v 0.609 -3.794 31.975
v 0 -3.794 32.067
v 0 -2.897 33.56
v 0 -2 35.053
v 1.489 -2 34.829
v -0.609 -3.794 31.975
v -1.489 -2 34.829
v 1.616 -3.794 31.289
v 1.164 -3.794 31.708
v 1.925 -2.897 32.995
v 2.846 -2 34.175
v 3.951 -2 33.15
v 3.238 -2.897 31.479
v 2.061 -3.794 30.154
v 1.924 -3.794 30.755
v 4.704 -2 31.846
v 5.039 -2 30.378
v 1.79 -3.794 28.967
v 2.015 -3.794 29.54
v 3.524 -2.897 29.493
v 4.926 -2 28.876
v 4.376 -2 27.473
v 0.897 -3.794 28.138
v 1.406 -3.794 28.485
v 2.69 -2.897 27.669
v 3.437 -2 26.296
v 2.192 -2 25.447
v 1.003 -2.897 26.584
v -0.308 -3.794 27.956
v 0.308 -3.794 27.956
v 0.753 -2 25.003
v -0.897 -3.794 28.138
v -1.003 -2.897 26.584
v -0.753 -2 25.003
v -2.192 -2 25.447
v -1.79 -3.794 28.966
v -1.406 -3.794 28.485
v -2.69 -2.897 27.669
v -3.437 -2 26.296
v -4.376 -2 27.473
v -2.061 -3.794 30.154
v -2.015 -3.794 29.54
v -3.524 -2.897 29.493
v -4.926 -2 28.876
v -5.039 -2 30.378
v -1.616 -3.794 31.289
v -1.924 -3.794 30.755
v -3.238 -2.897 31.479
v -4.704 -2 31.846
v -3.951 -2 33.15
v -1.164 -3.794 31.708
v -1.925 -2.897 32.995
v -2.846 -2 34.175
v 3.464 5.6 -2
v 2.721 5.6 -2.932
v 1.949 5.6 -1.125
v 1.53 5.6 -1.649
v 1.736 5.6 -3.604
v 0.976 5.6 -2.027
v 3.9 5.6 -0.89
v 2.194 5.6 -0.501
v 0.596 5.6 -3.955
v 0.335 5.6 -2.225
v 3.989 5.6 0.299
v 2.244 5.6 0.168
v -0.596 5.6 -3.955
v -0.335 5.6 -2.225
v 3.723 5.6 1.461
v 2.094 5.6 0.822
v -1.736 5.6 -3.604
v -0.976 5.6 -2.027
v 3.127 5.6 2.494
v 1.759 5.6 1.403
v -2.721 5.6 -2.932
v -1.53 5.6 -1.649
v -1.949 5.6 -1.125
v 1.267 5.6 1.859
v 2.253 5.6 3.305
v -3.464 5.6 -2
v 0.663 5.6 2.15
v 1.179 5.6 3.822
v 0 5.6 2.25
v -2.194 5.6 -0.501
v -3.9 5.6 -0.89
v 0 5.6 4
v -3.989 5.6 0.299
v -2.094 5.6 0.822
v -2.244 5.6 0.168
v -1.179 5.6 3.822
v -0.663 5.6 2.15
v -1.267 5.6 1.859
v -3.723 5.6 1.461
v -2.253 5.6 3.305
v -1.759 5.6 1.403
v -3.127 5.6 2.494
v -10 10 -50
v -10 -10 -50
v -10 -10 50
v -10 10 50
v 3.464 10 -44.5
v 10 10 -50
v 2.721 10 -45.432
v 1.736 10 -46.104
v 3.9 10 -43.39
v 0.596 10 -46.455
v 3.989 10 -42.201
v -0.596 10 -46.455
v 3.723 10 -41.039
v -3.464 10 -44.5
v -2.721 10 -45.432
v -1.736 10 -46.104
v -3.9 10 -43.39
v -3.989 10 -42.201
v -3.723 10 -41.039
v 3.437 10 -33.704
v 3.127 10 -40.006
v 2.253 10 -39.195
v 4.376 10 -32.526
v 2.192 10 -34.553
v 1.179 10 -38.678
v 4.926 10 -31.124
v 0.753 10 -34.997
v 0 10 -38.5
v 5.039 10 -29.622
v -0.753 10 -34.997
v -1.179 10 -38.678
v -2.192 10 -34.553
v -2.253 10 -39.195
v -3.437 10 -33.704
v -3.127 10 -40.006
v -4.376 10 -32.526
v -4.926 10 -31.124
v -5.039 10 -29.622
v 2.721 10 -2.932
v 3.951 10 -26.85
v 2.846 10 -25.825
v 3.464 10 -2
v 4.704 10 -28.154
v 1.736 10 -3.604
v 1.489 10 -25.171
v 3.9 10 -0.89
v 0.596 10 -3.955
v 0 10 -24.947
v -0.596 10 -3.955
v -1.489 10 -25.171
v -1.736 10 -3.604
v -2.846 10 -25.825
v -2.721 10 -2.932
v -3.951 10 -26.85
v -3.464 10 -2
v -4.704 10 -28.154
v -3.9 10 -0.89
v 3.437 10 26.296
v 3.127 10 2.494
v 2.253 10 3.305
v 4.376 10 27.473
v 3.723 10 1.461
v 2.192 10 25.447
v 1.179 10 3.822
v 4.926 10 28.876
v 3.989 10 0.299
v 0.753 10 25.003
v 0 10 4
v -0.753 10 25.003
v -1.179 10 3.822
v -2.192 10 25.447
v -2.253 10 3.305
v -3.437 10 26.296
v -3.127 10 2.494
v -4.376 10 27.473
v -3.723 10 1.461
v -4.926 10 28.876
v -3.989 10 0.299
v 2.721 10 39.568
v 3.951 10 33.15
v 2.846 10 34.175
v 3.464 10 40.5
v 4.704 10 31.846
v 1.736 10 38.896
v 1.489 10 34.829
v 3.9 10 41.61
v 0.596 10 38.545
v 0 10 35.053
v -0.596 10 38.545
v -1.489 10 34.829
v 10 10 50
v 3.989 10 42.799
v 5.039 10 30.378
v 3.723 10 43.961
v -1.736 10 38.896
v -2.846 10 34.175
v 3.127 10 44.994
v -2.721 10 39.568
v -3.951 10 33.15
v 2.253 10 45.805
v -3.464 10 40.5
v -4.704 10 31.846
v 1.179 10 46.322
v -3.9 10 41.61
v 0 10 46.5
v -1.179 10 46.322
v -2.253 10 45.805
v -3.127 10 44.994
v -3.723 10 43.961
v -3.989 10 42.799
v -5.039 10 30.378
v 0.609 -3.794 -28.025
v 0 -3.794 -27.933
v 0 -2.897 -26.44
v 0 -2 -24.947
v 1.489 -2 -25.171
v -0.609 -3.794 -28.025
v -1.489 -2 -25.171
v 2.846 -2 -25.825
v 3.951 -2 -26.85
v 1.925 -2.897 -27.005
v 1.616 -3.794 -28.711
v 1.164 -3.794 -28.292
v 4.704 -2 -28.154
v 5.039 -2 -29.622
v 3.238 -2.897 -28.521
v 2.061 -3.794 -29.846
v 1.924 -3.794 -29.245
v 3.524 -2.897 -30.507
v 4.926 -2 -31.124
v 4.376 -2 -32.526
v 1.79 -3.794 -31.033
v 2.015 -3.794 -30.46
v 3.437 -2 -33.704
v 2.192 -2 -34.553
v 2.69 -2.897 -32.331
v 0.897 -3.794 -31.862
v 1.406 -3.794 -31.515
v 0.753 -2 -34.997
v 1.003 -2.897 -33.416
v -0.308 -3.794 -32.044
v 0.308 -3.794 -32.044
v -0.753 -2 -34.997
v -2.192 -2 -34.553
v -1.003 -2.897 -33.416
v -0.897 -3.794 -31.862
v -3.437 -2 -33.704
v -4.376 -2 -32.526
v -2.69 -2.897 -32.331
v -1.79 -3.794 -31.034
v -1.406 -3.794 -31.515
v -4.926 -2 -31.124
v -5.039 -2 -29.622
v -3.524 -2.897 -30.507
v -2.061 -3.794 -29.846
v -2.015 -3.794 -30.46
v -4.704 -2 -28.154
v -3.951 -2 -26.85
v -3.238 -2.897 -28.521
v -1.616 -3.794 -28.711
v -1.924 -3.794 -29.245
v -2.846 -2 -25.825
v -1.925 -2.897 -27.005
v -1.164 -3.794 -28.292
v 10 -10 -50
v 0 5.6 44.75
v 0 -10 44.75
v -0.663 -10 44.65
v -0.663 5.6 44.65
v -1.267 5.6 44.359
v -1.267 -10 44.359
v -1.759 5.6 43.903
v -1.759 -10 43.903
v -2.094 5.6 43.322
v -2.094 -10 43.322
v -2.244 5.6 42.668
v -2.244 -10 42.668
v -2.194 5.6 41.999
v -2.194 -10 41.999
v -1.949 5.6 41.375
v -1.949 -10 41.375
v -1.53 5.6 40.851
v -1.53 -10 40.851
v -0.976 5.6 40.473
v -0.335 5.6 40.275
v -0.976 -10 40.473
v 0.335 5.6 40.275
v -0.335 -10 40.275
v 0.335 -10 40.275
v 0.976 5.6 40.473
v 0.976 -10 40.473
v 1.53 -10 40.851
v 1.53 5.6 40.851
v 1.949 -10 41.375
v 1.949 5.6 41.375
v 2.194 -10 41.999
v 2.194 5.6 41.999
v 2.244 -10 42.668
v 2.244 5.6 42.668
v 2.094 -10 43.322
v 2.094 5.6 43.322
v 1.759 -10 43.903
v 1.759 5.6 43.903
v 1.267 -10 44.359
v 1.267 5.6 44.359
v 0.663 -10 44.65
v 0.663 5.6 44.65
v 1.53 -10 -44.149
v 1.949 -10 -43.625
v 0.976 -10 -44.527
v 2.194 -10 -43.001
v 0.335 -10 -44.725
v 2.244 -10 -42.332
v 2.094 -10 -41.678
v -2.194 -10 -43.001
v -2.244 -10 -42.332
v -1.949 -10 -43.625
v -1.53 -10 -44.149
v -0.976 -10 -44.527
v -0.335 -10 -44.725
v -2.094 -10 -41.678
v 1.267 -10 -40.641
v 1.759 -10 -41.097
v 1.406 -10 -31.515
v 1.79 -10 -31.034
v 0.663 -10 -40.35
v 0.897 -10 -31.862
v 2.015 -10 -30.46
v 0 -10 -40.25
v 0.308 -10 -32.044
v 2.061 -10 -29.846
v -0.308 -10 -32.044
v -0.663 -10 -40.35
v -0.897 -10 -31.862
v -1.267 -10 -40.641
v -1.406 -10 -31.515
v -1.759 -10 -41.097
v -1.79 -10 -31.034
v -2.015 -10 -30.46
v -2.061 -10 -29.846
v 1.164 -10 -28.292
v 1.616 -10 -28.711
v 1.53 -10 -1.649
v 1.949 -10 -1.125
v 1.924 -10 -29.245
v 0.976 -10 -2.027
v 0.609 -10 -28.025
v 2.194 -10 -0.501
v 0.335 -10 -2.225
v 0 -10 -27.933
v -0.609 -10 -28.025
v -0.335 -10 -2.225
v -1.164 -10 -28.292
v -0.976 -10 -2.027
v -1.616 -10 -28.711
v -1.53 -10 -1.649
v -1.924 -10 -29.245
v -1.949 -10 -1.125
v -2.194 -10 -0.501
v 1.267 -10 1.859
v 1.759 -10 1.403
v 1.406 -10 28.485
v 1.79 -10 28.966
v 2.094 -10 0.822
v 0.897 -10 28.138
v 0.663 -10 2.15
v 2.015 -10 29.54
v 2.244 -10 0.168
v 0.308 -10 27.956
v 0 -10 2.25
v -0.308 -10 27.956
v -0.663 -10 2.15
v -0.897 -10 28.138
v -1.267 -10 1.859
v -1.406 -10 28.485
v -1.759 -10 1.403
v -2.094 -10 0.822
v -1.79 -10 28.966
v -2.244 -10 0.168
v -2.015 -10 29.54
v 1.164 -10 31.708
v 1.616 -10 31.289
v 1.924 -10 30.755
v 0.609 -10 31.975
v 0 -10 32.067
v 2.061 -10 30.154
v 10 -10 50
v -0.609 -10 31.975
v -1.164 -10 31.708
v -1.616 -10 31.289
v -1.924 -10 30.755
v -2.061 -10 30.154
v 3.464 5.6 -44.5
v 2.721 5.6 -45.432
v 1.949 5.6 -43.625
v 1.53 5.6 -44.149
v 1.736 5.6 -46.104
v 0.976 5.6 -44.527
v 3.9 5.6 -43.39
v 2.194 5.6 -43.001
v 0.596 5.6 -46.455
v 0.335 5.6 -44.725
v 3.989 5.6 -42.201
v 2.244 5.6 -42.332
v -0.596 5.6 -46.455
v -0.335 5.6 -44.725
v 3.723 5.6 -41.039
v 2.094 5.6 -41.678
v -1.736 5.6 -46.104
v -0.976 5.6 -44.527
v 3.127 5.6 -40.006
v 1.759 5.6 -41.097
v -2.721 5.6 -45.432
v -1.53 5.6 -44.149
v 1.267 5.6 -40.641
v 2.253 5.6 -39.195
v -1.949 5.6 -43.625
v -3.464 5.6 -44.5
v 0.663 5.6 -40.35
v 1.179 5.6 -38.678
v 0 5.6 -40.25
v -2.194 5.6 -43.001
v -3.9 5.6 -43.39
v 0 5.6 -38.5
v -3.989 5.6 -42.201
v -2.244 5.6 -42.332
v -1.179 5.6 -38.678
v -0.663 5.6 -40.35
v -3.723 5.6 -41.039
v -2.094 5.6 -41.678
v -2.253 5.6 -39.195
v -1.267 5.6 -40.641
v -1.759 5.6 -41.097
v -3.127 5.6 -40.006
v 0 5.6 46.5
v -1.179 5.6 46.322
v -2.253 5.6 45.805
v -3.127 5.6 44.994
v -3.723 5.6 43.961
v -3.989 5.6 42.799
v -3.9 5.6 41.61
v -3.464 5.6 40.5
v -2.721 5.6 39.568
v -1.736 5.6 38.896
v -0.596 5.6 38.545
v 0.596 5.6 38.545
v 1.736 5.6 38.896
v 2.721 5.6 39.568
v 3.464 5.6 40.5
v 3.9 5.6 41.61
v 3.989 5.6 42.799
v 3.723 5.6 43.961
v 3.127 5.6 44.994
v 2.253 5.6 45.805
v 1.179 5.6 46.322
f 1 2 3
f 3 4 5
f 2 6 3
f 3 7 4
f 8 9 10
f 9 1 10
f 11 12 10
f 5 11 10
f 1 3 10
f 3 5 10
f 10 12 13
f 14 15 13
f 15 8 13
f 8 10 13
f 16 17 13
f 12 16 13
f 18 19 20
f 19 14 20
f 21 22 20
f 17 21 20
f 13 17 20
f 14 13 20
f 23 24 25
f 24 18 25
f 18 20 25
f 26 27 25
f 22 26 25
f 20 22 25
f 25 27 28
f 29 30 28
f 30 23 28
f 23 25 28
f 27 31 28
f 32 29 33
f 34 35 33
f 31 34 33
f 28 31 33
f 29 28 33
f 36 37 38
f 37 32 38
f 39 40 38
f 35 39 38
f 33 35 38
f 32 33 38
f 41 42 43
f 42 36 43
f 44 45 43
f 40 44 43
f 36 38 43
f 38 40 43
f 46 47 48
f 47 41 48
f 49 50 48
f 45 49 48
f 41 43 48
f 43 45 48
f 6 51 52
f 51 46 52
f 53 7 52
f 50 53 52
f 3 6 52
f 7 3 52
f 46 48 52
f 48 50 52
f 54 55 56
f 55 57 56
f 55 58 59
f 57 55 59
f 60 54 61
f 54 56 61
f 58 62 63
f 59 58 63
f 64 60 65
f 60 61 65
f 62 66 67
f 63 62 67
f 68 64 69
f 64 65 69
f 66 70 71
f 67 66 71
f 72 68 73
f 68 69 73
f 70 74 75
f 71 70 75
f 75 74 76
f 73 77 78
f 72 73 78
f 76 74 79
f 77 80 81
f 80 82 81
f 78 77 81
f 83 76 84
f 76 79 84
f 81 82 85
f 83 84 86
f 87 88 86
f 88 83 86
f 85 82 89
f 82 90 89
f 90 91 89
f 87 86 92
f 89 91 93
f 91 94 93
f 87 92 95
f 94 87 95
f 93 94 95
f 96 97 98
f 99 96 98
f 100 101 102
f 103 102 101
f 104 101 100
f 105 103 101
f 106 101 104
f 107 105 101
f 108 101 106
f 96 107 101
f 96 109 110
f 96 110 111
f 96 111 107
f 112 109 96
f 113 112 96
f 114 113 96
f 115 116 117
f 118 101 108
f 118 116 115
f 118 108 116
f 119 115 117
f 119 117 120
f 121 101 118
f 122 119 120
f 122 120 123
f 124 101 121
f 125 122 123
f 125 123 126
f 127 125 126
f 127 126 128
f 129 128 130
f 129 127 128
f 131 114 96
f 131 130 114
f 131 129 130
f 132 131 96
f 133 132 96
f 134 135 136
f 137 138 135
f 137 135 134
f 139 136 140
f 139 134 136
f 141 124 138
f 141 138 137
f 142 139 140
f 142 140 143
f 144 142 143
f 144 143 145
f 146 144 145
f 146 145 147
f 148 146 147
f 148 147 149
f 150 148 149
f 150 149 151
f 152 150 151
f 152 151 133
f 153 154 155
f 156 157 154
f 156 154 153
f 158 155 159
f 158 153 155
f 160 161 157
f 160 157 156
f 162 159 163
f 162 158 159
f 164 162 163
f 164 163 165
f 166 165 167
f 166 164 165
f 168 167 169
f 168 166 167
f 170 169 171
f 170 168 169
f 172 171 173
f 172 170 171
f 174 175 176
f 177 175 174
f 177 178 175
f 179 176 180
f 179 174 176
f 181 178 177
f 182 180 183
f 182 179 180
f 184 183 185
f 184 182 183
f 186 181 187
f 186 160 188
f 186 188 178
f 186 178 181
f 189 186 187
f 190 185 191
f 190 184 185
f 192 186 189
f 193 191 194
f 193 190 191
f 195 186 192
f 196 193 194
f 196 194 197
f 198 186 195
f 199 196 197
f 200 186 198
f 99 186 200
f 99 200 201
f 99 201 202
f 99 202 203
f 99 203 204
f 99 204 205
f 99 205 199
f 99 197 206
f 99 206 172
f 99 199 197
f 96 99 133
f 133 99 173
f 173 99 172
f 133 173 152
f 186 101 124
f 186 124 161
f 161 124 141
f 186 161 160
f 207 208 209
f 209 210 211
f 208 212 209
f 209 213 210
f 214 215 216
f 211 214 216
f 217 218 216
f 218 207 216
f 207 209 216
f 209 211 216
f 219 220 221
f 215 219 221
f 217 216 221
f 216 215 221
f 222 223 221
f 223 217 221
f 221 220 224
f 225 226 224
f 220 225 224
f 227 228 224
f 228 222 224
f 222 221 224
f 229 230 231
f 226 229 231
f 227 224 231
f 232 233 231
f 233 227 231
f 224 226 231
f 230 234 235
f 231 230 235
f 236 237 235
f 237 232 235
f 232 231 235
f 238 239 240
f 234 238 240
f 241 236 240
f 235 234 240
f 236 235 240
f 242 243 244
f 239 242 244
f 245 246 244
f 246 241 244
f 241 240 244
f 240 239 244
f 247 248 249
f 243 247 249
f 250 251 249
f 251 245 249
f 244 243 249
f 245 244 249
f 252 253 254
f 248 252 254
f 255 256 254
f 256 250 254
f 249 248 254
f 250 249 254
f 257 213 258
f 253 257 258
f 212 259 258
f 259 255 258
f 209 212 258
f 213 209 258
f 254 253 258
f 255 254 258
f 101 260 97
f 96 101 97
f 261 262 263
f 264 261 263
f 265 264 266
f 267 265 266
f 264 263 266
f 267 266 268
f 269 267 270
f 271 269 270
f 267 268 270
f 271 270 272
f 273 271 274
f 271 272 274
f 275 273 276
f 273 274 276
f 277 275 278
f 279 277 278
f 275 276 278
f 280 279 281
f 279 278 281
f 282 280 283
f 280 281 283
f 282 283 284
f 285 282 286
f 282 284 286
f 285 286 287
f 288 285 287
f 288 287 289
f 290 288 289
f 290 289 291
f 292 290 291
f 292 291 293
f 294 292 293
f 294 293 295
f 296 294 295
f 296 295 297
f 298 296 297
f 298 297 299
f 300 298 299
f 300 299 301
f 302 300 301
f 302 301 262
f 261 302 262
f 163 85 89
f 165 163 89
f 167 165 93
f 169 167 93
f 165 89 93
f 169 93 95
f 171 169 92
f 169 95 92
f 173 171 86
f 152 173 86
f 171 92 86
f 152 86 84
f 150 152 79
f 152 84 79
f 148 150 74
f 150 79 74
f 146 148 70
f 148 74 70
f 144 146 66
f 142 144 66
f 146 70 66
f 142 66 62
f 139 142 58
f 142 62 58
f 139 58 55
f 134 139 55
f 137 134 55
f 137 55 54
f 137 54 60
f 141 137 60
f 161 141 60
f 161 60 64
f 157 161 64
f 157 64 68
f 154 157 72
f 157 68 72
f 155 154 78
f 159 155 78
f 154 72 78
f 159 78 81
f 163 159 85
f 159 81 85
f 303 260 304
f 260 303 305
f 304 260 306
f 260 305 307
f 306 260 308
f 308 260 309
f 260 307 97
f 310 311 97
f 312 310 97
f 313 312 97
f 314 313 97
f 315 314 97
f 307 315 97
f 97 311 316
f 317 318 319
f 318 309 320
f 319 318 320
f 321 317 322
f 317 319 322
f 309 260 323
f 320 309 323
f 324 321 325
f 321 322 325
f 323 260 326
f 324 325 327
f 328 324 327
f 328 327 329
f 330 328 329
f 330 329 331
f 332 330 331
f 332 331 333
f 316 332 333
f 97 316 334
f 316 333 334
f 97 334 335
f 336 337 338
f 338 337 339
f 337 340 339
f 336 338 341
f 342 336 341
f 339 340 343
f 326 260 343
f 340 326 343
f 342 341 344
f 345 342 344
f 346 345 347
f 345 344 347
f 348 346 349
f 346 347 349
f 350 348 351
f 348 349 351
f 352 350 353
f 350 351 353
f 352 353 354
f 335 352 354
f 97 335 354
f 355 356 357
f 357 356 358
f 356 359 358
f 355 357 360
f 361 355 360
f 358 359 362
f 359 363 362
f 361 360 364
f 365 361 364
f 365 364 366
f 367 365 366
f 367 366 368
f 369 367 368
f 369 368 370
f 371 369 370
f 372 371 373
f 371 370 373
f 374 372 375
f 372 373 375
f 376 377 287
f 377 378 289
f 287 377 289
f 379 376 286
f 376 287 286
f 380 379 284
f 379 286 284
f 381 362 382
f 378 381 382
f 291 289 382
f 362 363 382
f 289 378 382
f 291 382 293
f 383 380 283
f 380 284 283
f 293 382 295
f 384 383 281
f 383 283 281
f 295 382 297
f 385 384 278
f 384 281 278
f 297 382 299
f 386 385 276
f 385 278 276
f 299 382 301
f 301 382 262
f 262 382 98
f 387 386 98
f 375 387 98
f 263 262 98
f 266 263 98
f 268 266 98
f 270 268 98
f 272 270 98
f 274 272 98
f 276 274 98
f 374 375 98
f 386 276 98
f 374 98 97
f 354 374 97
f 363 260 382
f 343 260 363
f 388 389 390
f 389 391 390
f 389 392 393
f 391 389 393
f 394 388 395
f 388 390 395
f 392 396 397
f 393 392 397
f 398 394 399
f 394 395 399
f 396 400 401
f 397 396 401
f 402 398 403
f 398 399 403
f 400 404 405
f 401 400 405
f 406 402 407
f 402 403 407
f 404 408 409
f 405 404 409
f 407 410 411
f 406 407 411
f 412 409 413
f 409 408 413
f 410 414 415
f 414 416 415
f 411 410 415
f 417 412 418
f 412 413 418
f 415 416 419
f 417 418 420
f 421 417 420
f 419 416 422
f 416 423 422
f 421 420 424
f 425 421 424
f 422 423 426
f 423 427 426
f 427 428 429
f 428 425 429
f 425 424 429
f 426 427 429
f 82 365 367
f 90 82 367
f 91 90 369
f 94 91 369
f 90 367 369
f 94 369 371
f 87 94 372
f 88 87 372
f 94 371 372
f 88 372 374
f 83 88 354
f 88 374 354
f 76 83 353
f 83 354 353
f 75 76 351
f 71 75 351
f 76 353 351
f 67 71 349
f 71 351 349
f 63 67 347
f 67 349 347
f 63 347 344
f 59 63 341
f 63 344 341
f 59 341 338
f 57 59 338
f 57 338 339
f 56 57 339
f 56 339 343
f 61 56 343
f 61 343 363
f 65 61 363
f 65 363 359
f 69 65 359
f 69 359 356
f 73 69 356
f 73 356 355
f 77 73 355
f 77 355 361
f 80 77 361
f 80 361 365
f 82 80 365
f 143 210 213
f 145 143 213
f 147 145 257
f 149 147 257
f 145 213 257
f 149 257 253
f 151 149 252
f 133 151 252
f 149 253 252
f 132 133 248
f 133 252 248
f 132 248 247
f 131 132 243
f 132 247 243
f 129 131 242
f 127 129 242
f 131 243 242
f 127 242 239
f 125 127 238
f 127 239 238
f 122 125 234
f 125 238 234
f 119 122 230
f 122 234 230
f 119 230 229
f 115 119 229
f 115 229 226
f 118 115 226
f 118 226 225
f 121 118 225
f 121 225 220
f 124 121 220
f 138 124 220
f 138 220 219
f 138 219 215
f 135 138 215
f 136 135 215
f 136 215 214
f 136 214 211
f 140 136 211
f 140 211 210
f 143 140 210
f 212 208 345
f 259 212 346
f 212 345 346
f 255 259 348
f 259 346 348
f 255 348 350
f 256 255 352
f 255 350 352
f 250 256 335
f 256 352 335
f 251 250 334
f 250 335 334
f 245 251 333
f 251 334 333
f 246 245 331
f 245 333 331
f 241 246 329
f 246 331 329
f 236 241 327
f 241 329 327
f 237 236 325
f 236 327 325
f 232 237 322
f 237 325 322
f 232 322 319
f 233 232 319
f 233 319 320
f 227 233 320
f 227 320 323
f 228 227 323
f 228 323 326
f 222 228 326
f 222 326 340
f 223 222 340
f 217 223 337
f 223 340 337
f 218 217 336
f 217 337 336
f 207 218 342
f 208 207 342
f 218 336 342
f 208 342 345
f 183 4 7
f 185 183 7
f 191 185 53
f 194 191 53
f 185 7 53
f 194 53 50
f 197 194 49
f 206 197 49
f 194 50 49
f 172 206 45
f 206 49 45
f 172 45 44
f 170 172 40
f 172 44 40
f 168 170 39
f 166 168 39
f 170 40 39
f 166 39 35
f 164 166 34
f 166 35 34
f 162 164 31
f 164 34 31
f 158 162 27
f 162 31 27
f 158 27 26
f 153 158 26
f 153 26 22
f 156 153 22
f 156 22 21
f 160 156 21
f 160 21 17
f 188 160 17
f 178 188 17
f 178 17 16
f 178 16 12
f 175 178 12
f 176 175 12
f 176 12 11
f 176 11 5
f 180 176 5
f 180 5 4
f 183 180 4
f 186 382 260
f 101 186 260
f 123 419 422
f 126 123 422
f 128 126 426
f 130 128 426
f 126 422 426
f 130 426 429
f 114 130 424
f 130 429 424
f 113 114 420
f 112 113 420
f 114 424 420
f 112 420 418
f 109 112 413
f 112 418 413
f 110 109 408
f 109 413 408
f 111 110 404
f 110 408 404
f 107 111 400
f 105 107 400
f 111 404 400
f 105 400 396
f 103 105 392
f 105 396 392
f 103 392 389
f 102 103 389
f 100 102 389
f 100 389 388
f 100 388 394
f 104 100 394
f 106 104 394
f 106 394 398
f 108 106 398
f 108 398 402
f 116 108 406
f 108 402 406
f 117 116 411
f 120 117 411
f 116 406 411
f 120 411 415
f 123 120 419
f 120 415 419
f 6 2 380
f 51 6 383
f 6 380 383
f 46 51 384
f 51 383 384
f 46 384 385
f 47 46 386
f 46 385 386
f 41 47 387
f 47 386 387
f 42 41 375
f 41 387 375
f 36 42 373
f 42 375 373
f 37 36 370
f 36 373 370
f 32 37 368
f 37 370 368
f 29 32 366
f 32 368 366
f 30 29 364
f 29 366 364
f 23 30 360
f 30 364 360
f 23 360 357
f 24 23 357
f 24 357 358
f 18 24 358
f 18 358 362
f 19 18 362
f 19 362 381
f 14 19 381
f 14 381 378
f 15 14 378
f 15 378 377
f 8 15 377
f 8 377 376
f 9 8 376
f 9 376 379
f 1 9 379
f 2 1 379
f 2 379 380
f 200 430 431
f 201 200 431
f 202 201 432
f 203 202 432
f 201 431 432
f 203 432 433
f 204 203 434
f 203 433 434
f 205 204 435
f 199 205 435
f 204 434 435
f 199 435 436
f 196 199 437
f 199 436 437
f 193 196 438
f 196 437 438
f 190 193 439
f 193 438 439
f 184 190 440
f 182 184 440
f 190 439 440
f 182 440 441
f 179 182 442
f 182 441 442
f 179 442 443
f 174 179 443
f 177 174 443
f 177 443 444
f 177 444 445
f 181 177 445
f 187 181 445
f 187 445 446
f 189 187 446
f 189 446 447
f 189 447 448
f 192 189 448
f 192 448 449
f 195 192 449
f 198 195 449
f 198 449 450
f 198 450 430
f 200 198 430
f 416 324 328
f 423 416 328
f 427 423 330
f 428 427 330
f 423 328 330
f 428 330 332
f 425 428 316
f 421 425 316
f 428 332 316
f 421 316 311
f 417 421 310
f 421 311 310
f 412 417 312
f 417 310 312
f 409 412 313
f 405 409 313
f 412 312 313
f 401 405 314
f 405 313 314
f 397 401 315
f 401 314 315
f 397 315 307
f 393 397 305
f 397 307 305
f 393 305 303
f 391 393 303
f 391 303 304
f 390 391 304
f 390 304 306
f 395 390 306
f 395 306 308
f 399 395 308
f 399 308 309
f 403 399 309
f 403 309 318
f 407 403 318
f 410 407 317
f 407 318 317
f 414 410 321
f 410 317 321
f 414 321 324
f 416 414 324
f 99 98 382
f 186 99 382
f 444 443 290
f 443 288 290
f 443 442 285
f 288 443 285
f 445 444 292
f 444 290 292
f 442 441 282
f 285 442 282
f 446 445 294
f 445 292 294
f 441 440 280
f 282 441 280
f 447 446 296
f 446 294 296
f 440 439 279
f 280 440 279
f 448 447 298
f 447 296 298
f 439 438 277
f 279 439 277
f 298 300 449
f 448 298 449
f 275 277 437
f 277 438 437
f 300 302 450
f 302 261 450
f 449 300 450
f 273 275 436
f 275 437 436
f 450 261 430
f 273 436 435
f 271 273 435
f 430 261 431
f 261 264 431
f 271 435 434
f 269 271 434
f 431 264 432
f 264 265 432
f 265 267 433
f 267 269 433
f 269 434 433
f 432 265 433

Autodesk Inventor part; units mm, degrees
ref_plane "YZ Plane" through (0, 0, 0) normal (1, 0, 0) x (0, 1, 0)
ref_plane "XZ Plane" through (0, 0, 0) normal (0, 1, 0) x (-1, 0, 0)
ref_plane "XY Plane" through (0, 0, 0) normal (0, 0, 1) x (1, 0, 0)
sketch "Skizze1" plane through (0, 0, 0) normal (0, 1, 0) x (-1, 0, 0)
  line L0 (10, 50) -> (-10, 50)
  line L1 (-10, 50) -> (-10, -50)
  line L2 (-10, -50) -> (10, -50)
  line L3 (10, -50) -> (10, 50)
  line L4 (10, 50) -> (-10, -50) construction
  line L5 (-10, 50) -> (10, -50) construction
  point P0 (0, 0)
  dimension "d0" = 100
  dimension "d1" = 20
extrude "Extrusion1" add sketch "Skizze1" along normal mid plane 20
sketch "Skizze2" plane through (0, 10, 0) normal (0, 1, 0) x (1, 0, 0)
  line L0 (-10, 50) -> (-10, -50) projected
  line L1 (-10, 0) -> (10, 0)
  line L2 (10, -50) -> (10, 50) projected
  point P0 (0, 0)
  point P1 (0, -30)
  point P2 (0, 30)
  dimension "d4" = 60
hole "Bohrung1" at (0, 10, 30) at (0, 10, -30) direction (0, -1, 0) diameter 10.106 depth 12 tip angle 118 thread size "M12x1.75" class "6H" standard "ISO Metric profile"
sketch "Skizze3" plane through (0, 10, 0) normal (0, 1, 0) x (1, 0, 0)
  circle A0 centre (0, -30) radius 5.053 projected
  point P0 (0, 0)
hole "Bohrung2" at (0, 10, 30) direction (0, -1, 0) diameter 4.134 end through all thread size "M5x0.8" class "6H" standard "ISO Metric profile"
sketch "Skizze4" plane through (0, 10, 0) normal (0, 1, 0) x (1, 0, 0)
  circle A0 centre (0, 30) radius 5.053 projected
  point P0 (0, 0)
hole "Bohrung3" at (0, 10, -30) direction (0, -1, 0) diameter 4.134 end through all thread size "M5x0.8" class "6H" standard "ISO Metric profile"
sketch "Skizze5" plane through (0, 10, 0) normal (0, 1, 0) x (1, 0, 0)
  line L0 (-10, -50) -> (-10, 50) projected
  line L1 (-10, 0) -> (10, 0)
  line L2 (10, 50) -> (10, -50) projected
  point P0 (0, 0)
  point P1 (0, -42.5)
  point P2 (0, 0)
  point P3 (0, 42.5)
  point P4 (0, 0)
  dimension "d26" = 85
hole "Bohrung4" at (0, 10, 0) at (0, 10, -42.5) at (0, 10, 42.5) direction (0, -1, 0) diameter 4.5 depth 20 counterbore diameter 8 counterbore depth 4.4
properties part number "106.014.01_Anbindung_Vereinzelung" material "Aluminium 6061"
